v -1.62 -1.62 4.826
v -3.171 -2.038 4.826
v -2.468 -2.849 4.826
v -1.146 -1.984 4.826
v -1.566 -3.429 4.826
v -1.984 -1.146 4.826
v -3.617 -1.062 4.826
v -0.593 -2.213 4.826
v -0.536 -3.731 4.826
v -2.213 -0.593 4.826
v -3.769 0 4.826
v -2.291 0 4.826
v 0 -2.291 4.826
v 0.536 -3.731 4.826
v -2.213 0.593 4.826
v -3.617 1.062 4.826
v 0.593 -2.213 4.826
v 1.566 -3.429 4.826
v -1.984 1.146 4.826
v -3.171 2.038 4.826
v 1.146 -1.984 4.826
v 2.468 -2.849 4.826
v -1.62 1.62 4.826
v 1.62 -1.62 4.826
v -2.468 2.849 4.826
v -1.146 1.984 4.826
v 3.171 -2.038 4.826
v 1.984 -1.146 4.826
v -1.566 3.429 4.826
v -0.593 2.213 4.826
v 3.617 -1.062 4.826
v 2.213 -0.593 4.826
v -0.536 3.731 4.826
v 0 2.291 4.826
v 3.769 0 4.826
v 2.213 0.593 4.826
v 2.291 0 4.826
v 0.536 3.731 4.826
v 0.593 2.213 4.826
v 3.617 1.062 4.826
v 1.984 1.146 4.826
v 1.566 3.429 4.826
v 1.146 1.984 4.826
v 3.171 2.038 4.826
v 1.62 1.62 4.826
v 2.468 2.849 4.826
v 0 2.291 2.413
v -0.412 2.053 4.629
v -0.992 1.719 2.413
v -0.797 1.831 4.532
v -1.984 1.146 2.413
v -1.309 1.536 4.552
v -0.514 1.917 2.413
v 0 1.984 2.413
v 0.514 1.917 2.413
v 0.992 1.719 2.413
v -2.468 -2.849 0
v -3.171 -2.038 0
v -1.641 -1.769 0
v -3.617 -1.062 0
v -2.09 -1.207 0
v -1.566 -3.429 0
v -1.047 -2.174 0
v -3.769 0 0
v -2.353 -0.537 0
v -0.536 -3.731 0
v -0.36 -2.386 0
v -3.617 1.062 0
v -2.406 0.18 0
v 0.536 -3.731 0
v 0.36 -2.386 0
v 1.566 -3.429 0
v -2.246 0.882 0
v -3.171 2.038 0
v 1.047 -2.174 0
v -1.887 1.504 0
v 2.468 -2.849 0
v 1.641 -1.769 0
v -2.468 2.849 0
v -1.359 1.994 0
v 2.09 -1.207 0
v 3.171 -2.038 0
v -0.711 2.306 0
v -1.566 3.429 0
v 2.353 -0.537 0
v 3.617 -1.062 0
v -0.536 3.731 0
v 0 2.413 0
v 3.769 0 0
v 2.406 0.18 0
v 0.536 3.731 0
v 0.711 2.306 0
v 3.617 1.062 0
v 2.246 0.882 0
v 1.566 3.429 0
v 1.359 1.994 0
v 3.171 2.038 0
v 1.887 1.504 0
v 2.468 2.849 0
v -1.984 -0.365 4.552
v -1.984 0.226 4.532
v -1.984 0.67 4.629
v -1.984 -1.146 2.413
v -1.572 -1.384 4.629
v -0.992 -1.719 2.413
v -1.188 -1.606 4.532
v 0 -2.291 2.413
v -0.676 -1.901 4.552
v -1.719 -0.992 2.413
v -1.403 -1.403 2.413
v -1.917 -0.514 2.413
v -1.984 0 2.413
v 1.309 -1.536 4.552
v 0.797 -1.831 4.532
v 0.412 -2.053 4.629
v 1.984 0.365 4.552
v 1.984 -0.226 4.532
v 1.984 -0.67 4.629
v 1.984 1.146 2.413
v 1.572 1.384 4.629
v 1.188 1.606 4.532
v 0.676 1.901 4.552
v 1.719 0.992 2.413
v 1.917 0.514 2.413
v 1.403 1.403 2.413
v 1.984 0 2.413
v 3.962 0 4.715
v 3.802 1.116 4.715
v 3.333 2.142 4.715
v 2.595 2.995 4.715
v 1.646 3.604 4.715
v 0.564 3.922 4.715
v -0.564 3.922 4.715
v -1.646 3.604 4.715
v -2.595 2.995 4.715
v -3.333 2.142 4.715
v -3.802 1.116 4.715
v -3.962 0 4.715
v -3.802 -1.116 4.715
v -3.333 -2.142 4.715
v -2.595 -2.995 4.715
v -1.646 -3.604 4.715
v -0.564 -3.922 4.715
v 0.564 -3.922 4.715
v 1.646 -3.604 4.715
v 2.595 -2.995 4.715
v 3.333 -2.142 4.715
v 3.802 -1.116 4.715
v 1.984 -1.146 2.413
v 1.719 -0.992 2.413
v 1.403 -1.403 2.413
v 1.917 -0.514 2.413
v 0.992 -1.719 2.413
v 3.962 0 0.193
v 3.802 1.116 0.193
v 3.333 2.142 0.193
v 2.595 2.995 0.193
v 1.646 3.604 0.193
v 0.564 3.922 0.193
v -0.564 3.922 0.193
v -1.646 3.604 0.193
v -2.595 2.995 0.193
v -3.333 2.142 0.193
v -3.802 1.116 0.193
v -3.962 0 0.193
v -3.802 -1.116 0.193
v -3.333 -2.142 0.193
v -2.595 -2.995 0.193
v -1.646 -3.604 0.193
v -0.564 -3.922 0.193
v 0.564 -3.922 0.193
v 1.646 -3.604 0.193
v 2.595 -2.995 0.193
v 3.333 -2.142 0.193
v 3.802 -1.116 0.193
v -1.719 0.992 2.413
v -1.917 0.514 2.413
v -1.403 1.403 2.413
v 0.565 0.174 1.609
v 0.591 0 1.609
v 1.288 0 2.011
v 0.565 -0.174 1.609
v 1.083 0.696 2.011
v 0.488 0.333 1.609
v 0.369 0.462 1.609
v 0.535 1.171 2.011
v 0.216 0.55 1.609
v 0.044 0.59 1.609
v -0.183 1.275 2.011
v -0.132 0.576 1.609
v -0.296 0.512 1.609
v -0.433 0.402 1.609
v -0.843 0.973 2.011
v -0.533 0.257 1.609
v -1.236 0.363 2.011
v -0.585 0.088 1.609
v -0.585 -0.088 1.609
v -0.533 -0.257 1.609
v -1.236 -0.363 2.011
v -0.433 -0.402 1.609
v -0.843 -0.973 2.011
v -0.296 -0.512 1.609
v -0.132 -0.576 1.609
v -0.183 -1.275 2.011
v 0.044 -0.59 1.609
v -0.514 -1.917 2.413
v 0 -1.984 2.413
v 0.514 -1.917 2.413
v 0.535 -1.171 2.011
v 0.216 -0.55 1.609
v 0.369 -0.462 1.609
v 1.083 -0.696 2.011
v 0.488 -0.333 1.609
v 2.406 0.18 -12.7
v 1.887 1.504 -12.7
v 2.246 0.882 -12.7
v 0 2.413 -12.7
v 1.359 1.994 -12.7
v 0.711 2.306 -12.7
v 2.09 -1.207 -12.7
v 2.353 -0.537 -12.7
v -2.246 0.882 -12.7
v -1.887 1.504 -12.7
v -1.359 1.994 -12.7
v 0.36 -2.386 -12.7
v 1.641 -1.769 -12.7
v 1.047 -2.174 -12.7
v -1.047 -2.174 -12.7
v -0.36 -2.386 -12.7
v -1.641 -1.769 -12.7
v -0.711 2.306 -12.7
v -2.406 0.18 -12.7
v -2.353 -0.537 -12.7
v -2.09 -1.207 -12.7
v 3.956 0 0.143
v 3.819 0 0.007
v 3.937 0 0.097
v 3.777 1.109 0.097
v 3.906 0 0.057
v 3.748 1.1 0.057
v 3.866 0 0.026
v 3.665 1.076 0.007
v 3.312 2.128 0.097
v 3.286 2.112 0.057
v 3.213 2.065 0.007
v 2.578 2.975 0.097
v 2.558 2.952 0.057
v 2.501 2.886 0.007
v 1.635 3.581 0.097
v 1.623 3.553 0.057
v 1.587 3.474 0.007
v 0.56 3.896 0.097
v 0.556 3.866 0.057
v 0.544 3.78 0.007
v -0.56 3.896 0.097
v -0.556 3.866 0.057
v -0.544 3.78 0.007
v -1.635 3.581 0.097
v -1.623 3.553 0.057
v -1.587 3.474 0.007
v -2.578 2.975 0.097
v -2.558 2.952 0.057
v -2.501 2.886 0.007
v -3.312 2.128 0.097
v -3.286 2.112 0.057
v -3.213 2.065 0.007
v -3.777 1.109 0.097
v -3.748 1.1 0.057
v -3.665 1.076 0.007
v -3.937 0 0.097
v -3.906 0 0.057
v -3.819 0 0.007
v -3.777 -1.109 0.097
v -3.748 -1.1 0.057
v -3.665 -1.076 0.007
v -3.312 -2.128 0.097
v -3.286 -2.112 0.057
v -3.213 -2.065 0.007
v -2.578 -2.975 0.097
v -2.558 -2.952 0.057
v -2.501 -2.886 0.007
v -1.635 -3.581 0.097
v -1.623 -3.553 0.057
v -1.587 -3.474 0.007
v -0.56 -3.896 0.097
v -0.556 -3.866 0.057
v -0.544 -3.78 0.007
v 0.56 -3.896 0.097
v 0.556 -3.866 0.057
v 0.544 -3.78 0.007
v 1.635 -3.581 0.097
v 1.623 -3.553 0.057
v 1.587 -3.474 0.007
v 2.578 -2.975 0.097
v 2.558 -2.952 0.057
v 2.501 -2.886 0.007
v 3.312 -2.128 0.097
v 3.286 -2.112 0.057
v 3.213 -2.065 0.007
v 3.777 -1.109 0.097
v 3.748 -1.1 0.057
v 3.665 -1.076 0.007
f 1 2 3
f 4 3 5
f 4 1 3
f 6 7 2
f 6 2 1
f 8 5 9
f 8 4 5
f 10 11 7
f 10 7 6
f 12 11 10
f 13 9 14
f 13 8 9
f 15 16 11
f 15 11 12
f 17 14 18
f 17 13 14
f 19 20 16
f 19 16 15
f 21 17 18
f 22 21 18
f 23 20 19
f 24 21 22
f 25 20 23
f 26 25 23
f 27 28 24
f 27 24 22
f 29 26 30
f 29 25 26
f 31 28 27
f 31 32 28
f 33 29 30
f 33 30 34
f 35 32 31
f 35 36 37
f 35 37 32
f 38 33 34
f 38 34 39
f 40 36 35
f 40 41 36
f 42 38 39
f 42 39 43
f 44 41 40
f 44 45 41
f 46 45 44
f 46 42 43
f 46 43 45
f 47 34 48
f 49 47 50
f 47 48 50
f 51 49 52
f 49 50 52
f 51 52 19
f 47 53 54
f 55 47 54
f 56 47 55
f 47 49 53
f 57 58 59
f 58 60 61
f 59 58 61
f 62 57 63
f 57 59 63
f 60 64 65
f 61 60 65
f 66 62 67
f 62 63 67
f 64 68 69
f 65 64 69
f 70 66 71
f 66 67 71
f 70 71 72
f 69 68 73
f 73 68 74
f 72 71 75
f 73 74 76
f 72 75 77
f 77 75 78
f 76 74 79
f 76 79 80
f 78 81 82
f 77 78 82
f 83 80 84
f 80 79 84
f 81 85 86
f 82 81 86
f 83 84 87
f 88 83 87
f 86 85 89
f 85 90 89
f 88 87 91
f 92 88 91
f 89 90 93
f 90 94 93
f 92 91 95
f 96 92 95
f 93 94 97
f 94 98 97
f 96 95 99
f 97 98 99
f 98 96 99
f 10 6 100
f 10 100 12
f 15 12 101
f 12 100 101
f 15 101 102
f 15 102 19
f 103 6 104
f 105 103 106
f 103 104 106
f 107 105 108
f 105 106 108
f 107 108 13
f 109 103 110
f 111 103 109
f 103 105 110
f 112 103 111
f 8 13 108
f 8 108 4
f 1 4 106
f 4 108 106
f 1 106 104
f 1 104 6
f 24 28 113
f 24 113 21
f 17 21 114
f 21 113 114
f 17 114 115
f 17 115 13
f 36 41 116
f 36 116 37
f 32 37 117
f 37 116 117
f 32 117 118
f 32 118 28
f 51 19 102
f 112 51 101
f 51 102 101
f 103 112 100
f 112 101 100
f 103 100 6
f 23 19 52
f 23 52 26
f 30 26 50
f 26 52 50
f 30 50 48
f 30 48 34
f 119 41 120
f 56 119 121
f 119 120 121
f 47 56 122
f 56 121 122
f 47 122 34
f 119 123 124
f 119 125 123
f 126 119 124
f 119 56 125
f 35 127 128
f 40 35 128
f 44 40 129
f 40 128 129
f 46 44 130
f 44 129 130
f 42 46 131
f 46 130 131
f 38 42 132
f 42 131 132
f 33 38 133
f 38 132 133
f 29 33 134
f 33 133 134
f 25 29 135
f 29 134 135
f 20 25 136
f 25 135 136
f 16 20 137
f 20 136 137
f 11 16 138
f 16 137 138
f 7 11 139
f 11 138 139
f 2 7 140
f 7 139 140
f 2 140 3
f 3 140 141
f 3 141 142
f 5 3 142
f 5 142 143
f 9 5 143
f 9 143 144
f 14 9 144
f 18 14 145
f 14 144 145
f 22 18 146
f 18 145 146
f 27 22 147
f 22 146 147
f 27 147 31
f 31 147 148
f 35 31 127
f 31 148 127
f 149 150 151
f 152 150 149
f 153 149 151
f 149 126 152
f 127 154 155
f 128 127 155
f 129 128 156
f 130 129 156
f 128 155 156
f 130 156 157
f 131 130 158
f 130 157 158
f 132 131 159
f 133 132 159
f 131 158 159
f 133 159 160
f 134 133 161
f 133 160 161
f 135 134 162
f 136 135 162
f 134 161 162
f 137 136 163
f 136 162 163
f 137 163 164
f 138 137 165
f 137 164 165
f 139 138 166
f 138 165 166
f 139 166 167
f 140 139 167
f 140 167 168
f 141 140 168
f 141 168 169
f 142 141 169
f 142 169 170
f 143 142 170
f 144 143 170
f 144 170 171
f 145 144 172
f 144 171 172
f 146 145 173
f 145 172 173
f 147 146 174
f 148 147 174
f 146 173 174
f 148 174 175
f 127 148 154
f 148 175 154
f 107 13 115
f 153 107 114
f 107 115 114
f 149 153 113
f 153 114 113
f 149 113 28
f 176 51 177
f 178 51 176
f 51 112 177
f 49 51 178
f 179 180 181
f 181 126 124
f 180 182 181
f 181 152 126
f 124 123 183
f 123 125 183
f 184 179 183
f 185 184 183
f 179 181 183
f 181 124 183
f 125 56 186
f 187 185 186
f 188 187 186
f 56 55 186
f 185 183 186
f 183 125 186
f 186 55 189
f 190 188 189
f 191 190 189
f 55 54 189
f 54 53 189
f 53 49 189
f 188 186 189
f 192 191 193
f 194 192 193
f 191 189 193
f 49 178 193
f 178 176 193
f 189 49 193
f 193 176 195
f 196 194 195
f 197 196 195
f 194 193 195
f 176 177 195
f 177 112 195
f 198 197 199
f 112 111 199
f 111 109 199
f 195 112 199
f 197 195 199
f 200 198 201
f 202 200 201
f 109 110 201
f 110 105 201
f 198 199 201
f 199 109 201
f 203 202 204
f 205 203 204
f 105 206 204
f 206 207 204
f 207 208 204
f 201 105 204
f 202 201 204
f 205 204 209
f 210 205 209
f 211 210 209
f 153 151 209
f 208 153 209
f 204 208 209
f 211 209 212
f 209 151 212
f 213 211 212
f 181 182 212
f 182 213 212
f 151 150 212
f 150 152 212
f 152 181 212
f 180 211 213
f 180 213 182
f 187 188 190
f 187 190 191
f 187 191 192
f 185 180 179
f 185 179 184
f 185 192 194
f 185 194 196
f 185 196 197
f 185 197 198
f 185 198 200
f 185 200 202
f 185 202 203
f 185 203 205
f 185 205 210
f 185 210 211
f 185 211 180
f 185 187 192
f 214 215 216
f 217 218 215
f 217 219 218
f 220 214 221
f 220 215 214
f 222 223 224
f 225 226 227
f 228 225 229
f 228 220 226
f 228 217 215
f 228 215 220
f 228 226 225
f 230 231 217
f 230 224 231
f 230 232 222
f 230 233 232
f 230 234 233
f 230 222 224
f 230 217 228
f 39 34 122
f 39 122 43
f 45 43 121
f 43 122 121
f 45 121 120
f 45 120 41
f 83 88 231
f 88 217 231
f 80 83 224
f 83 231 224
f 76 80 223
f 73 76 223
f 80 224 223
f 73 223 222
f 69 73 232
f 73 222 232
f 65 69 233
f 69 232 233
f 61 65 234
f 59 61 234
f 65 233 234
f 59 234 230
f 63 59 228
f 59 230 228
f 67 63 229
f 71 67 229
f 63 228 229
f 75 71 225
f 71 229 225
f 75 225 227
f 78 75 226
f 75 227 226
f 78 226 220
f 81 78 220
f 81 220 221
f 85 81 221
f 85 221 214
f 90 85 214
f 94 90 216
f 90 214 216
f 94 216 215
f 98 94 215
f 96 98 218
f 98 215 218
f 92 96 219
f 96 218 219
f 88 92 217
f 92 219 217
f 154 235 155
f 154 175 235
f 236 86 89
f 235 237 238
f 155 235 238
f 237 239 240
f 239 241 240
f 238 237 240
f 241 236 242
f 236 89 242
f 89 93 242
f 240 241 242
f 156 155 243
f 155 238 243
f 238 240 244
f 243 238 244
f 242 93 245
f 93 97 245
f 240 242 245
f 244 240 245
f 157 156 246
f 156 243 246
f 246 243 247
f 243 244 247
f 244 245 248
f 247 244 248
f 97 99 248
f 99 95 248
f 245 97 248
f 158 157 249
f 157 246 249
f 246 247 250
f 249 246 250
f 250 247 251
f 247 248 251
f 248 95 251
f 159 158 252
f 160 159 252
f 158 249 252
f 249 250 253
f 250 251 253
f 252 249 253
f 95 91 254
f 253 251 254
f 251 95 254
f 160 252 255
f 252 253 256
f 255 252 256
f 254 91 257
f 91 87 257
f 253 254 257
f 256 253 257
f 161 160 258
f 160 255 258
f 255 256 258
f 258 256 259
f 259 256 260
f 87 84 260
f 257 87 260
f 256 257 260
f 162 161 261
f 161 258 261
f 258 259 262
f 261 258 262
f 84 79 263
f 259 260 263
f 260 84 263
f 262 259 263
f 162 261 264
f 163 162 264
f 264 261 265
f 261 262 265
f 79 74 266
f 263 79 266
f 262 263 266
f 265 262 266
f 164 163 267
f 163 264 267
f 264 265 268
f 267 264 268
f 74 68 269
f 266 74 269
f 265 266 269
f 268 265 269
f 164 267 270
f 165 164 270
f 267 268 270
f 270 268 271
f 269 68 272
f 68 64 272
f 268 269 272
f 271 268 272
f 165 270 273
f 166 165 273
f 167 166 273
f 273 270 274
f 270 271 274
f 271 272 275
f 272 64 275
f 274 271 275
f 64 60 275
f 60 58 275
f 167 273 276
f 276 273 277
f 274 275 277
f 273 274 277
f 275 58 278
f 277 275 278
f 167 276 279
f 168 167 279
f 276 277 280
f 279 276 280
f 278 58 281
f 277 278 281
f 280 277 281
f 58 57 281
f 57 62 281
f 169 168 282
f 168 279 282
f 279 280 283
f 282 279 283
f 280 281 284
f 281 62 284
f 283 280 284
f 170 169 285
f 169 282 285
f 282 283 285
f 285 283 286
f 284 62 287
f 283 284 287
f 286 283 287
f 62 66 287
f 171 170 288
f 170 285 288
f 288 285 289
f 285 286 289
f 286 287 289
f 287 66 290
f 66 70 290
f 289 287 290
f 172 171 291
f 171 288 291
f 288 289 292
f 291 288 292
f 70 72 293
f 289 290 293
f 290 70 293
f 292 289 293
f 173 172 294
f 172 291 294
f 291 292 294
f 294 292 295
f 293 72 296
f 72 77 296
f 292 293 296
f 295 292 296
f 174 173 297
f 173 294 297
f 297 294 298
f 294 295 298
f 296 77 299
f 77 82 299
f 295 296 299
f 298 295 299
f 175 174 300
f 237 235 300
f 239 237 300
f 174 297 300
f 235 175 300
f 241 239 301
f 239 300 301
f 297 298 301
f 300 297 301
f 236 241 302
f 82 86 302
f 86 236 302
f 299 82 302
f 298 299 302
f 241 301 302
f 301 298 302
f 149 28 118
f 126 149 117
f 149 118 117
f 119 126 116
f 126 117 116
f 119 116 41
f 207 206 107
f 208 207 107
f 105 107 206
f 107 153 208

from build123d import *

# Parameters (mm, degrees)
SKETCH1_W          = 12.7
SKETCH1_H          = 2.413
SKETCH4_R          = 3.9624
EXTRUDE1_DEPTH     = 4.826
FILLET1_R          = 0.19304
CHAMFER1_SIZE      = 0.19304
CHAMFER1_SIZE2     = 0.111451696
CUT_EXTRUDE1_DEPTH = 2.413
SKETCH8_R          = 1.984375
CUT_EXTRUDE5_DEPTH = 0.804333333
CUT_EXTRUDE5_DRAFT = -60


with BuildPart() as part:
    # Sketch1 → Revolve1 (revolve)
    with BuildSketch(Plane(origin=(0, 0, 0), x_dir=(0, 0, -1), z_dir=(1, 0, 0))):
        with Locations((6.35, 1.2065)):
            Rectangle(SKETCH1_W, SKETCH1_H)
    revolve(axis=Axis((0, 0, 0), (0, 0, 1)))

    # Sketch4 → Extrude1 (add)
    with BuildSketch(Plane.XY):
        Circle(SKETCH4_R)
    extrude(amount=EXTRUDE1_DEPTH)

    # Fillet1
    fillet1_edges = [part.edges().sort_by_distance(p)[0] for p in [
        (-3.9624, 0, 0),
    ]]
    fillet(fillet1_edges, radius=FILLET1_R)

    # Chamfer1
    chamfer1_edges = [part.edges().sort_by_distance(p)[0] for p in [
        (-3.9624, 0, 4.826),
    ]]
    chamfer1_side = [part.faces().sort_by_distance(p)[0] for p in [
        (0, 0, 4.826),
    ]]
    chamfer(chamfer1_edges, length=CHAMFER1_SIZE, length2=CHAMFER1_SIZE2, reference=chamfer1_side[0])

    # Sketch6 → Cut-Extrude1 (cut)
    with BuildSketch(Plane.XY.offset(4.826)):
        Polygon((0, -2.291358881), (1.984375, -1.14567944), (1.984375, 1.14567944), (0, 2.291358881), (-1.984375, 1.14567944), (-1.984375, -1.14567944), align=None)
    extrude(amount=-CUT_EXTRUDE1_DEPTH, mode=Mode.SUBTRACT)

    # Cut-Extrude4 cone 1 section (through the dimple's axis) → Cut-Extrude4 (revolve, cut)
    with BuildSketch(Plane(origin=(0, 0, 4.826), x_dir=(0, -1, 0), z_dir=(1, 0, 0))):
        Polygon((0, 0), (2.291358881, 0), (0, 2.291358881), align=None)
    revolve(axis=Axis((0, 0, 4.826), (0, 0, -1)), mode=Mode.SUBTRACT)


with BuildPart() as cut_extrude5_tool:
    # Sketch8 → Cut-Extrude5 (with draft: the straight prism first)
    with BuildSketch(Plane.XY.offset(2.413)):
        Circle(SKETCH8_R)
    extrude(amount=-CUT_EXTRUDE5_DEPTH)
    # Cut-Extrude5: the draft: its side faces are tilted about the plane it starts from
    cut_extrude5_sides = [cut_extrude5_tool.faces().sort_by_distance(p)[0] for p in [
        (-1.984375, 0, 2.010833333),
    ]]
    draft(cut_extrude5_sides, Plane.XY.offset(2.413), CUT_EXTRUDE5_DRAFT)


with BuildPart() as part_1:
    add(part.part)

    # Cut-Extrude5: cut by cut_extrude5_tool
    add(cut_extrude5_tool.part, mode=Mode.SUBTRACT)


solid = part_1.part
